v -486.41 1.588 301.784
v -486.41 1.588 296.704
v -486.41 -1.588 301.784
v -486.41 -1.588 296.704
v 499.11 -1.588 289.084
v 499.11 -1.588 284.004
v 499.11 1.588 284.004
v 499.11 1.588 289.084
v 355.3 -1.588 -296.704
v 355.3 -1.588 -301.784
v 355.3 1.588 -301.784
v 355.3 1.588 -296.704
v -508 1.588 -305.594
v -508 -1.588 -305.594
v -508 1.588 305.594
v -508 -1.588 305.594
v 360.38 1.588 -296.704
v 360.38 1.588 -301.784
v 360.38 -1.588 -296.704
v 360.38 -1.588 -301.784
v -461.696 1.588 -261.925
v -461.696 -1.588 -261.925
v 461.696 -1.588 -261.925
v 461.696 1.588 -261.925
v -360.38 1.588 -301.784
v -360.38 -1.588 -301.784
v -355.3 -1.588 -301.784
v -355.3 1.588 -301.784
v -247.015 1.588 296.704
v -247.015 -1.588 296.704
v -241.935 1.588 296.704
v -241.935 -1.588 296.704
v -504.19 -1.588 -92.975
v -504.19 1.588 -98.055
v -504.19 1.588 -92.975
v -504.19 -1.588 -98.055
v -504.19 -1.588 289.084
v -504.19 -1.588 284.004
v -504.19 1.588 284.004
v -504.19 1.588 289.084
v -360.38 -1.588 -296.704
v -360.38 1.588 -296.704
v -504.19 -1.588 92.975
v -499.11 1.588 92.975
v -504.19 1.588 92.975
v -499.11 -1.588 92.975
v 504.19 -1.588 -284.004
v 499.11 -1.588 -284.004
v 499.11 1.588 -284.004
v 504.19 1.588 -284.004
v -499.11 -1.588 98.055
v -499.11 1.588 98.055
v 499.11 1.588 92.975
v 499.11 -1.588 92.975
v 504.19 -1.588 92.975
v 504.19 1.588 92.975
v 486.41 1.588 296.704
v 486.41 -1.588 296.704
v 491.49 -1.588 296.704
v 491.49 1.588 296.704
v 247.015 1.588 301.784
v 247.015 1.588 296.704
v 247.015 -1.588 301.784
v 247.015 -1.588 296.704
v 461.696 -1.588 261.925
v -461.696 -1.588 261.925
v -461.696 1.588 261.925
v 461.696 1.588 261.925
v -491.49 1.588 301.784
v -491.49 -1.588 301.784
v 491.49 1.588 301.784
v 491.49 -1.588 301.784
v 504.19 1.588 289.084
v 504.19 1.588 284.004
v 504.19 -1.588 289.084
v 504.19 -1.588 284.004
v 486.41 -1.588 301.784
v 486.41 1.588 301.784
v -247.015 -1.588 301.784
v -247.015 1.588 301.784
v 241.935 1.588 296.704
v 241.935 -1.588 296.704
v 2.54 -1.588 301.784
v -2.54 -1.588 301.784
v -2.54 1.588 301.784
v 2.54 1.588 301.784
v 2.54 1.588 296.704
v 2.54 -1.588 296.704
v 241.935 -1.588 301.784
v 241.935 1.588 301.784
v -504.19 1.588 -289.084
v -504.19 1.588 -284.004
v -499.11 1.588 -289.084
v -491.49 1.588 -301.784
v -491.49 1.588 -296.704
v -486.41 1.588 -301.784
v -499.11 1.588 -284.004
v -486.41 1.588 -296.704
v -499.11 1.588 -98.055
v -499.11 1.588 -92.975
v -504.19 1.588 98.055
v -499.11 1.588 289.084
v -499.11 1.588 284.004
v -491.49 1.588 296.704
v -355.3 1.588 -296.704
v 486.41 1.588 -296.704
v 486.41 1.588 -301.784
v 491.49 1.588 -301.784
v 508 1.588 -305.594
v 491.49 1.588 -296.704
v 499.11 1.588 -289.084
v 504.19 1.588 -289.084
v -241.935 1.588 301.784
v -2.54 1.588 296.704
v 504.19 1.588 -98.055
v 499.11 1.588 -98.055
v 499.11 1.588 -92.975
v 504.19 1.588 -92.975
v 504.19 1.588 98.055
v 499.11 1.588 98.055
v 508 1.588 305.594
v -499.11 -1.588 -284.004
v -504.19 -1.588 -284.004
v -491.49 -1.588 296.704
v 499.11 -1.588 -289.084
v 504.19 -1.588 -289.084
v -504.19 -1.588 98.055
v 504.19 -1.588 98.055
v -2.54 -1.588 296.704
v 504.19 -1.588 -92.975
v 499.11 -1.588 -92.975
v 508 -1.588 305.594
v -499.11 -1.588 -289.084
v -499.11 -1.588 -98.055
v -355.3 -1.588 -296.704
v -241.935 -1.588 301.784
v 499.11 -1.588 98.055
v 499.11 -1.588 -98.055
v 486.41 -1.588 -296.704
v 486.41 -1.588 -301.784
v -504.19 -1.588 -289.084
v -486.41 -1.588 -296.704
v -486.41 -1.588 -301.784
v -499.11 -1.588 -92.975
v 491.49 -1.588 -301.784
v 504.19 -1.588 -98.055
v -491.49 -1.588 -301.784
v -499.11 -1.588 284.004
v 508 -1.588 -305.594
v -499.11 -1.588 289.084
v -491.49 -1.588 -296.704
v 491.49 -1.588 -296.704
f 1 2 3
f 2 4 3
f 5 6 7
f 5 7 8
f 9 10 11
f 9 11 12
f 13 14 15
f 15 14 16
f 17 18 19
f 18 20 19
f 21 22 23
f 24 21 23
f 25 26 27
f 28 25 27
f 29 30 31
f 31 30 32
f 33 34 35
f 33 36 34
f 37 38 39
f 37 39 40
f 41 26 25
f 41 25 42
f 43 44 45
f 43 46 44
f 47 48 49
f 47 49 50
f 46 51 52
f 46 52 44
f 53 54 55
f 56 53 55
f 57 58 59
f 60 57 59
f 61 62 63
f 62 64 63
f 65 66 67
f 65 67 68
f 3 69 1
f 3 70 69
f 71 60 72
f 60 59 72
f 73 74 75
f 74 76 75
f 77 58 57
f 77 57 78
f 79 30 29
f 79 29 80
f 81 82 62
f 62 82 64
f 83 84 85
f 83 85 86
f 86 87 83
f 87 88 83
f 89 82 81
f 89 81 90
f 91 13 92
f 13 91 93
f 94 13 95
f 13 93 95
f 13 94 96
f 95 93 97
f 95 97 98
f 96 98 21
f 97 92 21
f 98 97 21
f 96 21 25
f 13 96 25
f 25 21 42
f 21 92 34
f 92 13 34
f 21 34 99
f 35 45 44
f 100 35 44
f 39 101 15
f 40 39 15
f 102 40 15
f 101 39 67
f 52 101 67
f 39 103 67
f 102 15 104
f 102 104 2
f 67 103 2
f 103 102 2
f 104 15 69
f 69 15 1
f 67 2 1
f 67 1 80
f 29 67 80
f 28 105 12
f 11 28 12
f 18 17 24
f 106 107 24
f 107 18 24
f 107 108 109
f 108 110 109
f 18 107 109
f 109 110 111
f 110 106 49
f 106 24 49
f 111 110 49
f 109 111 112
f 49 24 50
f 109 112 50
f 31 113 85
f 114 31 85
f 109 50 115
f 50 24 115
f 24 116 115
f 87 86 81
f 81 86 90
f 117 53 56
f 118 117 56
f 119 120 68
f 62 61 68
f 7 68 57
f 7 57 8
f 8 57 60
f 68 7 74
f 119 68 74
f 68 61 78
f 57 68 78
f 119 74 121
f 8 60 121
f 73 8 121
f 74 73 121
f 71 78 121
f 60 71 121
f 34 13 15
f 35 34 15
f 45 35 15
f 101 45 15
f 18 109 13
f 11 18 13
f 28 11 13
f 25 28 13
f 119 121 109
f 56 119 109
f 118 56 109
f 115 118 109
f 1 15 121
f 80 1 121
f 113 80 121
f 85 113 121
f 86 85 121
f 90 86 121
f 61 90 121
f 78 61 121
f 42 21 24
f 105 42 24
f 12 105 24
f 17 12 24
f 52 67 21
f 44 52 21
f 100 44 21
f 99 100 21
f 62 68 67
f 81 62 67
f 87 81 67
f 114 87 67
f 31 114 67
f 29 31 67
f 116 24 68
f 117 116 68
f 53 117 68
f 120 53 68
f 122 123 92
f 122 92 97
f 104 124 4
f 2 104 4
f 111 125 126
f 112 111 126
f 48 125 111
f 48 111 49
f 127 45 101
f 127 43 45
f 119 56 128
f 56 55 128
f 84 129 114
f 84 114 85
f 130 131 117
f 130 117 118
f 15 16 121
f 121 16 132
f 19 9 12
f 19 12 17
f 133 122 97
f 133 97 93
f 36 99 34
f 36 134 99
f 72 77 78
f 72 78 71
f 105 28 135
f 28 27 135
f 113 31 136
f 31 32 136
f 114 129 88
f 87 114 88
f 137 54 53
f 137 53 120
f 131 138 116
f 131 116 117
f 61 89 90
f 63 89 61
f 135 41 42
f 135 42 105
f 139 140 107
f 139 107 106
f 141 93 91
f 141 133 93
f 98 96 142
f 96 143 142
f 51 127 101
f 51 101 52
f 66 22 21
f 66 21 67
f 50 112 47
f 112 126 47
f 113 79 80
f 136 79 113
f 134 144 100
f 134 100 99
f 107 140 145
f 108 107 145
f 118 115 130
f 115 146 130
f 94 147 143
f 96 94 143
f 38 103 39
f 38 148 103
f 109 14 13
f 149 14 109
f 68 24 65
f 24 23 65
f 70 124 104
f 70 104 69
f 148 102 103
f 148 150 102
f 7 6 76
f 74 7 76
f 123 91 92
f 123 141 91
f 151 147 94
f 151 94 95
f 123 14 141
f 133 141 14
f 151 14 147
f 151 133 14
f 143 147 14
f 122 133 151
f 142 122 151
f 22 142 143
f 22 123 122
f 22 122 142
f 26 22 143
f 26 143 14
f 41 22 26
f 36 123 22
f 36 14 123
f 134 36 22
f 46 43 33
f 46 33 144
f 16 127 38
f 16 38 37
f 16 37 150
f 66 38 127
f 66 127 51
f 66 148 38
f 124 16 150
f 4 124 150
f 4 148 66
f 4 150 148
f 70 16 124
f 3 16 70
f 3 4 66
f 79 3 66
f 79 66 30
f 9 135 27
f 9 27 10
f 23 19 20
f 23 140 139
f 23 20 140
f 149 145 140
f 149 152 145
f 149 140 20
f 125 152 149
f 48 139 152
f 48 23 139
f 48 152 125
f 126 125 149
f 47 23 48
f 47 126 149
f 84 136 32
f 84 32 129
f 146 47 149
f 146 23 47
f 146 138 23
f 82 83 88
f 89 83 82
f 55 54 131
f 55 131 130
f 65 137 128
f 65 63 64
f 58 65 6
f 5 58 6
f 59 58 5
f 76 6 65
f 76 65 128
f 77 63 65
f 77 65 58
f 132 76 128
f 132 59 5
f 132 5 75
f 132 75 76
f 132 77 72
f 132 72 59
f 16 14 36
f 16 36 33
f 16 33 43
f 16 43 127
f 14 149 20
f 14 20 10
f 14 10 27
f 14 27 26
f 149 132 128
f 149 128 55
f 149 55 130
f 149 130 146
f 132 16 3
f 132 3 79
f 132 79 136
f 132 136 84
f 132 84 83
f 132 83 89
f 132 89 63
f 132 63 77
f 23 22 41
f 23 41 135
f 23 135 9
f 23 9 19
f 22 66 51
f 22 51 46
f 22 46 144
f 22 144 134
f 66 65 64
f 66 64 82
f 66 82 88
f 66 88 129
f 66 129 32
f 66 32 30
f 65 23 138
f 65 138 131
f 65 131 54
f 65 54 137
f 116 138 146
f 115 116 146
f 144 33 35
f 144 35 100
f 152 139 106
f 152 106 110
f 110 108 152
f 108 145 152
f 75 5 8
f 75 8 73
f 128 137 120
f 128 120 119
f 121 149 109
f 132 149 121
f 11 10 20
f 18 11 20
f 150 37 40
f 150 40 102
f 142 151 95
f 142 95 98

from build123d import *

# Parameters (mm, degrees)
F0_W     = 1016
F0_H     = 611.1875
F0_W_2   = 5.08
F0_H_2   = 5.08
F0_W_3   = 990.6
F0_H_3   = 585.7875
F0_R     = 5.969
F0_W_4   = 951.992
F0_H_4   = 552.45
F0_W_5   = 923.392
F0_H_5   = 523.85
F1_DEPTH = 1.5875


# Not quite as in the source:
# - a feature names something its author has since deleted; it is built from what else it names


with BuildPart() as f1:
    # F0 (on Front) → F1 (new body, symmetric)
    with BuildSketch(Plane.XZ):
        Rectangle(F0_W, F0_H)
        with Locations((-488.95, -299.24375)):
            Rectangle(F0_W_2, F0_H_2, mode=Mode.SUBTRACT)
        Polygon((-504.19, -284.00375), (-501.65, -284.00375), (-499.11, -284.00375), (-499.11, -289.08375), (-504.19, -289.08375), align=None, mode=Mode.SUBTRACT)
        with Locations((-357.84, -299.24375)):
            Rectangle(F0_W_2, F0_H_2, mode=Mode.SUBTRACT)
        Polygon((-504.19, -92.9745833333), (-501.65, -92.9745833333), (-499.11, -92.9745833333), (-499.11, -98.0545833333), (-501.65, -98.0545833333), (-504.19, -98.0545833333), align=None, mode=Mode.SUBTRACT)
        with Locations((357.84, -299.24375)):
            Rectangle(F0_W_2, F0_H_2, mode=Mode.SUBTRACT)
        with Locations((488.95, -299.24375)):
            Rectangle(F0_W_2, F0_H_2, mode=Mode.SUBTRACT)
        with Locations((501.65, -286.54375)):
            Rectangle(F0_W_2, F0_H_2, mode=Mode.SUBTRACT)
        Rectangle(F0_W_3, F0_H_3, mode=Mode.SUBTRACT)
        with Locations((501.65, -95.5145833333)):
            Rectangle(F0_W_2, F0_H_2, mode=Mode.SUBTRACT)
        Polygon((-504.19, 98.0545833333), (-501.65, 98.0545833333), (-499.11, 98.0545833333), (-499.11, 92.9745833333), (-501.65, 92.9745833333), (-504.19, 92.9745833333), align=None, mode=Mode.SUBTRACT)
        Polygon((-501.65, 284.00375), (-504.19, 284.00375), (-504.19, 289.08375), (-499.11, 289.08375), (-499.11, 284.00375), align=None, mode=Mode.SUBTRACT)
        with Locations((-488.95, 299.24375)):
            Circle(F0_R, mode=Mode.SUBTRACT)
        with Locations((-244.475, 299.24375)):
            Rectangle(F0_W_2, F0_H_2, mode=Mode.SUBTRACT)
        with Locations((501.65, 95.5145833333)):
            Rectangle(F0_W_2, F0_H_2, mode=Mode.SUBTRACT)
        with Locations((0, 299.24375)):
            Rectangle(F0_W_2, F0_H_2, mode=Mode.SUBTRACT)
        with Locations((244.475, 299.24375)):
            Rectangle(F0_W_2, F0_H_2, mode=Mode.SUBTRACT)
        with Locations((501.65, 286.54375)):
            Rectangle(F0_W_2, F0_H_2, mode=Mode.SUBTRACT)
        with Locations((488.95, 299.24375)):
            Rectangle(F0_W_2, F0_H_2, mode=Mode.SUBTRACT)
        Rectangle(F0_W_3, F0_H_3)
        Rectangle(F0_W_4, F0_H_4, mode=Mode.SUBTRACT)
        Rectangle(F0_W_4, F0_H_4)
        Rectangle(F0_W_5, F0_H_5, mode=Mode.SUBTRACT)
        with Locations((-488.95, 299.24375)):
            Circle(F0_R)
        with Locations((-488.95, 299.24375)):
            Rectangle(F0_W_2, F0_H_2, mode=Mode.SUBTRACT)
    extrude(amount=F1_DEPTH, both=True)


solid = f1.part
